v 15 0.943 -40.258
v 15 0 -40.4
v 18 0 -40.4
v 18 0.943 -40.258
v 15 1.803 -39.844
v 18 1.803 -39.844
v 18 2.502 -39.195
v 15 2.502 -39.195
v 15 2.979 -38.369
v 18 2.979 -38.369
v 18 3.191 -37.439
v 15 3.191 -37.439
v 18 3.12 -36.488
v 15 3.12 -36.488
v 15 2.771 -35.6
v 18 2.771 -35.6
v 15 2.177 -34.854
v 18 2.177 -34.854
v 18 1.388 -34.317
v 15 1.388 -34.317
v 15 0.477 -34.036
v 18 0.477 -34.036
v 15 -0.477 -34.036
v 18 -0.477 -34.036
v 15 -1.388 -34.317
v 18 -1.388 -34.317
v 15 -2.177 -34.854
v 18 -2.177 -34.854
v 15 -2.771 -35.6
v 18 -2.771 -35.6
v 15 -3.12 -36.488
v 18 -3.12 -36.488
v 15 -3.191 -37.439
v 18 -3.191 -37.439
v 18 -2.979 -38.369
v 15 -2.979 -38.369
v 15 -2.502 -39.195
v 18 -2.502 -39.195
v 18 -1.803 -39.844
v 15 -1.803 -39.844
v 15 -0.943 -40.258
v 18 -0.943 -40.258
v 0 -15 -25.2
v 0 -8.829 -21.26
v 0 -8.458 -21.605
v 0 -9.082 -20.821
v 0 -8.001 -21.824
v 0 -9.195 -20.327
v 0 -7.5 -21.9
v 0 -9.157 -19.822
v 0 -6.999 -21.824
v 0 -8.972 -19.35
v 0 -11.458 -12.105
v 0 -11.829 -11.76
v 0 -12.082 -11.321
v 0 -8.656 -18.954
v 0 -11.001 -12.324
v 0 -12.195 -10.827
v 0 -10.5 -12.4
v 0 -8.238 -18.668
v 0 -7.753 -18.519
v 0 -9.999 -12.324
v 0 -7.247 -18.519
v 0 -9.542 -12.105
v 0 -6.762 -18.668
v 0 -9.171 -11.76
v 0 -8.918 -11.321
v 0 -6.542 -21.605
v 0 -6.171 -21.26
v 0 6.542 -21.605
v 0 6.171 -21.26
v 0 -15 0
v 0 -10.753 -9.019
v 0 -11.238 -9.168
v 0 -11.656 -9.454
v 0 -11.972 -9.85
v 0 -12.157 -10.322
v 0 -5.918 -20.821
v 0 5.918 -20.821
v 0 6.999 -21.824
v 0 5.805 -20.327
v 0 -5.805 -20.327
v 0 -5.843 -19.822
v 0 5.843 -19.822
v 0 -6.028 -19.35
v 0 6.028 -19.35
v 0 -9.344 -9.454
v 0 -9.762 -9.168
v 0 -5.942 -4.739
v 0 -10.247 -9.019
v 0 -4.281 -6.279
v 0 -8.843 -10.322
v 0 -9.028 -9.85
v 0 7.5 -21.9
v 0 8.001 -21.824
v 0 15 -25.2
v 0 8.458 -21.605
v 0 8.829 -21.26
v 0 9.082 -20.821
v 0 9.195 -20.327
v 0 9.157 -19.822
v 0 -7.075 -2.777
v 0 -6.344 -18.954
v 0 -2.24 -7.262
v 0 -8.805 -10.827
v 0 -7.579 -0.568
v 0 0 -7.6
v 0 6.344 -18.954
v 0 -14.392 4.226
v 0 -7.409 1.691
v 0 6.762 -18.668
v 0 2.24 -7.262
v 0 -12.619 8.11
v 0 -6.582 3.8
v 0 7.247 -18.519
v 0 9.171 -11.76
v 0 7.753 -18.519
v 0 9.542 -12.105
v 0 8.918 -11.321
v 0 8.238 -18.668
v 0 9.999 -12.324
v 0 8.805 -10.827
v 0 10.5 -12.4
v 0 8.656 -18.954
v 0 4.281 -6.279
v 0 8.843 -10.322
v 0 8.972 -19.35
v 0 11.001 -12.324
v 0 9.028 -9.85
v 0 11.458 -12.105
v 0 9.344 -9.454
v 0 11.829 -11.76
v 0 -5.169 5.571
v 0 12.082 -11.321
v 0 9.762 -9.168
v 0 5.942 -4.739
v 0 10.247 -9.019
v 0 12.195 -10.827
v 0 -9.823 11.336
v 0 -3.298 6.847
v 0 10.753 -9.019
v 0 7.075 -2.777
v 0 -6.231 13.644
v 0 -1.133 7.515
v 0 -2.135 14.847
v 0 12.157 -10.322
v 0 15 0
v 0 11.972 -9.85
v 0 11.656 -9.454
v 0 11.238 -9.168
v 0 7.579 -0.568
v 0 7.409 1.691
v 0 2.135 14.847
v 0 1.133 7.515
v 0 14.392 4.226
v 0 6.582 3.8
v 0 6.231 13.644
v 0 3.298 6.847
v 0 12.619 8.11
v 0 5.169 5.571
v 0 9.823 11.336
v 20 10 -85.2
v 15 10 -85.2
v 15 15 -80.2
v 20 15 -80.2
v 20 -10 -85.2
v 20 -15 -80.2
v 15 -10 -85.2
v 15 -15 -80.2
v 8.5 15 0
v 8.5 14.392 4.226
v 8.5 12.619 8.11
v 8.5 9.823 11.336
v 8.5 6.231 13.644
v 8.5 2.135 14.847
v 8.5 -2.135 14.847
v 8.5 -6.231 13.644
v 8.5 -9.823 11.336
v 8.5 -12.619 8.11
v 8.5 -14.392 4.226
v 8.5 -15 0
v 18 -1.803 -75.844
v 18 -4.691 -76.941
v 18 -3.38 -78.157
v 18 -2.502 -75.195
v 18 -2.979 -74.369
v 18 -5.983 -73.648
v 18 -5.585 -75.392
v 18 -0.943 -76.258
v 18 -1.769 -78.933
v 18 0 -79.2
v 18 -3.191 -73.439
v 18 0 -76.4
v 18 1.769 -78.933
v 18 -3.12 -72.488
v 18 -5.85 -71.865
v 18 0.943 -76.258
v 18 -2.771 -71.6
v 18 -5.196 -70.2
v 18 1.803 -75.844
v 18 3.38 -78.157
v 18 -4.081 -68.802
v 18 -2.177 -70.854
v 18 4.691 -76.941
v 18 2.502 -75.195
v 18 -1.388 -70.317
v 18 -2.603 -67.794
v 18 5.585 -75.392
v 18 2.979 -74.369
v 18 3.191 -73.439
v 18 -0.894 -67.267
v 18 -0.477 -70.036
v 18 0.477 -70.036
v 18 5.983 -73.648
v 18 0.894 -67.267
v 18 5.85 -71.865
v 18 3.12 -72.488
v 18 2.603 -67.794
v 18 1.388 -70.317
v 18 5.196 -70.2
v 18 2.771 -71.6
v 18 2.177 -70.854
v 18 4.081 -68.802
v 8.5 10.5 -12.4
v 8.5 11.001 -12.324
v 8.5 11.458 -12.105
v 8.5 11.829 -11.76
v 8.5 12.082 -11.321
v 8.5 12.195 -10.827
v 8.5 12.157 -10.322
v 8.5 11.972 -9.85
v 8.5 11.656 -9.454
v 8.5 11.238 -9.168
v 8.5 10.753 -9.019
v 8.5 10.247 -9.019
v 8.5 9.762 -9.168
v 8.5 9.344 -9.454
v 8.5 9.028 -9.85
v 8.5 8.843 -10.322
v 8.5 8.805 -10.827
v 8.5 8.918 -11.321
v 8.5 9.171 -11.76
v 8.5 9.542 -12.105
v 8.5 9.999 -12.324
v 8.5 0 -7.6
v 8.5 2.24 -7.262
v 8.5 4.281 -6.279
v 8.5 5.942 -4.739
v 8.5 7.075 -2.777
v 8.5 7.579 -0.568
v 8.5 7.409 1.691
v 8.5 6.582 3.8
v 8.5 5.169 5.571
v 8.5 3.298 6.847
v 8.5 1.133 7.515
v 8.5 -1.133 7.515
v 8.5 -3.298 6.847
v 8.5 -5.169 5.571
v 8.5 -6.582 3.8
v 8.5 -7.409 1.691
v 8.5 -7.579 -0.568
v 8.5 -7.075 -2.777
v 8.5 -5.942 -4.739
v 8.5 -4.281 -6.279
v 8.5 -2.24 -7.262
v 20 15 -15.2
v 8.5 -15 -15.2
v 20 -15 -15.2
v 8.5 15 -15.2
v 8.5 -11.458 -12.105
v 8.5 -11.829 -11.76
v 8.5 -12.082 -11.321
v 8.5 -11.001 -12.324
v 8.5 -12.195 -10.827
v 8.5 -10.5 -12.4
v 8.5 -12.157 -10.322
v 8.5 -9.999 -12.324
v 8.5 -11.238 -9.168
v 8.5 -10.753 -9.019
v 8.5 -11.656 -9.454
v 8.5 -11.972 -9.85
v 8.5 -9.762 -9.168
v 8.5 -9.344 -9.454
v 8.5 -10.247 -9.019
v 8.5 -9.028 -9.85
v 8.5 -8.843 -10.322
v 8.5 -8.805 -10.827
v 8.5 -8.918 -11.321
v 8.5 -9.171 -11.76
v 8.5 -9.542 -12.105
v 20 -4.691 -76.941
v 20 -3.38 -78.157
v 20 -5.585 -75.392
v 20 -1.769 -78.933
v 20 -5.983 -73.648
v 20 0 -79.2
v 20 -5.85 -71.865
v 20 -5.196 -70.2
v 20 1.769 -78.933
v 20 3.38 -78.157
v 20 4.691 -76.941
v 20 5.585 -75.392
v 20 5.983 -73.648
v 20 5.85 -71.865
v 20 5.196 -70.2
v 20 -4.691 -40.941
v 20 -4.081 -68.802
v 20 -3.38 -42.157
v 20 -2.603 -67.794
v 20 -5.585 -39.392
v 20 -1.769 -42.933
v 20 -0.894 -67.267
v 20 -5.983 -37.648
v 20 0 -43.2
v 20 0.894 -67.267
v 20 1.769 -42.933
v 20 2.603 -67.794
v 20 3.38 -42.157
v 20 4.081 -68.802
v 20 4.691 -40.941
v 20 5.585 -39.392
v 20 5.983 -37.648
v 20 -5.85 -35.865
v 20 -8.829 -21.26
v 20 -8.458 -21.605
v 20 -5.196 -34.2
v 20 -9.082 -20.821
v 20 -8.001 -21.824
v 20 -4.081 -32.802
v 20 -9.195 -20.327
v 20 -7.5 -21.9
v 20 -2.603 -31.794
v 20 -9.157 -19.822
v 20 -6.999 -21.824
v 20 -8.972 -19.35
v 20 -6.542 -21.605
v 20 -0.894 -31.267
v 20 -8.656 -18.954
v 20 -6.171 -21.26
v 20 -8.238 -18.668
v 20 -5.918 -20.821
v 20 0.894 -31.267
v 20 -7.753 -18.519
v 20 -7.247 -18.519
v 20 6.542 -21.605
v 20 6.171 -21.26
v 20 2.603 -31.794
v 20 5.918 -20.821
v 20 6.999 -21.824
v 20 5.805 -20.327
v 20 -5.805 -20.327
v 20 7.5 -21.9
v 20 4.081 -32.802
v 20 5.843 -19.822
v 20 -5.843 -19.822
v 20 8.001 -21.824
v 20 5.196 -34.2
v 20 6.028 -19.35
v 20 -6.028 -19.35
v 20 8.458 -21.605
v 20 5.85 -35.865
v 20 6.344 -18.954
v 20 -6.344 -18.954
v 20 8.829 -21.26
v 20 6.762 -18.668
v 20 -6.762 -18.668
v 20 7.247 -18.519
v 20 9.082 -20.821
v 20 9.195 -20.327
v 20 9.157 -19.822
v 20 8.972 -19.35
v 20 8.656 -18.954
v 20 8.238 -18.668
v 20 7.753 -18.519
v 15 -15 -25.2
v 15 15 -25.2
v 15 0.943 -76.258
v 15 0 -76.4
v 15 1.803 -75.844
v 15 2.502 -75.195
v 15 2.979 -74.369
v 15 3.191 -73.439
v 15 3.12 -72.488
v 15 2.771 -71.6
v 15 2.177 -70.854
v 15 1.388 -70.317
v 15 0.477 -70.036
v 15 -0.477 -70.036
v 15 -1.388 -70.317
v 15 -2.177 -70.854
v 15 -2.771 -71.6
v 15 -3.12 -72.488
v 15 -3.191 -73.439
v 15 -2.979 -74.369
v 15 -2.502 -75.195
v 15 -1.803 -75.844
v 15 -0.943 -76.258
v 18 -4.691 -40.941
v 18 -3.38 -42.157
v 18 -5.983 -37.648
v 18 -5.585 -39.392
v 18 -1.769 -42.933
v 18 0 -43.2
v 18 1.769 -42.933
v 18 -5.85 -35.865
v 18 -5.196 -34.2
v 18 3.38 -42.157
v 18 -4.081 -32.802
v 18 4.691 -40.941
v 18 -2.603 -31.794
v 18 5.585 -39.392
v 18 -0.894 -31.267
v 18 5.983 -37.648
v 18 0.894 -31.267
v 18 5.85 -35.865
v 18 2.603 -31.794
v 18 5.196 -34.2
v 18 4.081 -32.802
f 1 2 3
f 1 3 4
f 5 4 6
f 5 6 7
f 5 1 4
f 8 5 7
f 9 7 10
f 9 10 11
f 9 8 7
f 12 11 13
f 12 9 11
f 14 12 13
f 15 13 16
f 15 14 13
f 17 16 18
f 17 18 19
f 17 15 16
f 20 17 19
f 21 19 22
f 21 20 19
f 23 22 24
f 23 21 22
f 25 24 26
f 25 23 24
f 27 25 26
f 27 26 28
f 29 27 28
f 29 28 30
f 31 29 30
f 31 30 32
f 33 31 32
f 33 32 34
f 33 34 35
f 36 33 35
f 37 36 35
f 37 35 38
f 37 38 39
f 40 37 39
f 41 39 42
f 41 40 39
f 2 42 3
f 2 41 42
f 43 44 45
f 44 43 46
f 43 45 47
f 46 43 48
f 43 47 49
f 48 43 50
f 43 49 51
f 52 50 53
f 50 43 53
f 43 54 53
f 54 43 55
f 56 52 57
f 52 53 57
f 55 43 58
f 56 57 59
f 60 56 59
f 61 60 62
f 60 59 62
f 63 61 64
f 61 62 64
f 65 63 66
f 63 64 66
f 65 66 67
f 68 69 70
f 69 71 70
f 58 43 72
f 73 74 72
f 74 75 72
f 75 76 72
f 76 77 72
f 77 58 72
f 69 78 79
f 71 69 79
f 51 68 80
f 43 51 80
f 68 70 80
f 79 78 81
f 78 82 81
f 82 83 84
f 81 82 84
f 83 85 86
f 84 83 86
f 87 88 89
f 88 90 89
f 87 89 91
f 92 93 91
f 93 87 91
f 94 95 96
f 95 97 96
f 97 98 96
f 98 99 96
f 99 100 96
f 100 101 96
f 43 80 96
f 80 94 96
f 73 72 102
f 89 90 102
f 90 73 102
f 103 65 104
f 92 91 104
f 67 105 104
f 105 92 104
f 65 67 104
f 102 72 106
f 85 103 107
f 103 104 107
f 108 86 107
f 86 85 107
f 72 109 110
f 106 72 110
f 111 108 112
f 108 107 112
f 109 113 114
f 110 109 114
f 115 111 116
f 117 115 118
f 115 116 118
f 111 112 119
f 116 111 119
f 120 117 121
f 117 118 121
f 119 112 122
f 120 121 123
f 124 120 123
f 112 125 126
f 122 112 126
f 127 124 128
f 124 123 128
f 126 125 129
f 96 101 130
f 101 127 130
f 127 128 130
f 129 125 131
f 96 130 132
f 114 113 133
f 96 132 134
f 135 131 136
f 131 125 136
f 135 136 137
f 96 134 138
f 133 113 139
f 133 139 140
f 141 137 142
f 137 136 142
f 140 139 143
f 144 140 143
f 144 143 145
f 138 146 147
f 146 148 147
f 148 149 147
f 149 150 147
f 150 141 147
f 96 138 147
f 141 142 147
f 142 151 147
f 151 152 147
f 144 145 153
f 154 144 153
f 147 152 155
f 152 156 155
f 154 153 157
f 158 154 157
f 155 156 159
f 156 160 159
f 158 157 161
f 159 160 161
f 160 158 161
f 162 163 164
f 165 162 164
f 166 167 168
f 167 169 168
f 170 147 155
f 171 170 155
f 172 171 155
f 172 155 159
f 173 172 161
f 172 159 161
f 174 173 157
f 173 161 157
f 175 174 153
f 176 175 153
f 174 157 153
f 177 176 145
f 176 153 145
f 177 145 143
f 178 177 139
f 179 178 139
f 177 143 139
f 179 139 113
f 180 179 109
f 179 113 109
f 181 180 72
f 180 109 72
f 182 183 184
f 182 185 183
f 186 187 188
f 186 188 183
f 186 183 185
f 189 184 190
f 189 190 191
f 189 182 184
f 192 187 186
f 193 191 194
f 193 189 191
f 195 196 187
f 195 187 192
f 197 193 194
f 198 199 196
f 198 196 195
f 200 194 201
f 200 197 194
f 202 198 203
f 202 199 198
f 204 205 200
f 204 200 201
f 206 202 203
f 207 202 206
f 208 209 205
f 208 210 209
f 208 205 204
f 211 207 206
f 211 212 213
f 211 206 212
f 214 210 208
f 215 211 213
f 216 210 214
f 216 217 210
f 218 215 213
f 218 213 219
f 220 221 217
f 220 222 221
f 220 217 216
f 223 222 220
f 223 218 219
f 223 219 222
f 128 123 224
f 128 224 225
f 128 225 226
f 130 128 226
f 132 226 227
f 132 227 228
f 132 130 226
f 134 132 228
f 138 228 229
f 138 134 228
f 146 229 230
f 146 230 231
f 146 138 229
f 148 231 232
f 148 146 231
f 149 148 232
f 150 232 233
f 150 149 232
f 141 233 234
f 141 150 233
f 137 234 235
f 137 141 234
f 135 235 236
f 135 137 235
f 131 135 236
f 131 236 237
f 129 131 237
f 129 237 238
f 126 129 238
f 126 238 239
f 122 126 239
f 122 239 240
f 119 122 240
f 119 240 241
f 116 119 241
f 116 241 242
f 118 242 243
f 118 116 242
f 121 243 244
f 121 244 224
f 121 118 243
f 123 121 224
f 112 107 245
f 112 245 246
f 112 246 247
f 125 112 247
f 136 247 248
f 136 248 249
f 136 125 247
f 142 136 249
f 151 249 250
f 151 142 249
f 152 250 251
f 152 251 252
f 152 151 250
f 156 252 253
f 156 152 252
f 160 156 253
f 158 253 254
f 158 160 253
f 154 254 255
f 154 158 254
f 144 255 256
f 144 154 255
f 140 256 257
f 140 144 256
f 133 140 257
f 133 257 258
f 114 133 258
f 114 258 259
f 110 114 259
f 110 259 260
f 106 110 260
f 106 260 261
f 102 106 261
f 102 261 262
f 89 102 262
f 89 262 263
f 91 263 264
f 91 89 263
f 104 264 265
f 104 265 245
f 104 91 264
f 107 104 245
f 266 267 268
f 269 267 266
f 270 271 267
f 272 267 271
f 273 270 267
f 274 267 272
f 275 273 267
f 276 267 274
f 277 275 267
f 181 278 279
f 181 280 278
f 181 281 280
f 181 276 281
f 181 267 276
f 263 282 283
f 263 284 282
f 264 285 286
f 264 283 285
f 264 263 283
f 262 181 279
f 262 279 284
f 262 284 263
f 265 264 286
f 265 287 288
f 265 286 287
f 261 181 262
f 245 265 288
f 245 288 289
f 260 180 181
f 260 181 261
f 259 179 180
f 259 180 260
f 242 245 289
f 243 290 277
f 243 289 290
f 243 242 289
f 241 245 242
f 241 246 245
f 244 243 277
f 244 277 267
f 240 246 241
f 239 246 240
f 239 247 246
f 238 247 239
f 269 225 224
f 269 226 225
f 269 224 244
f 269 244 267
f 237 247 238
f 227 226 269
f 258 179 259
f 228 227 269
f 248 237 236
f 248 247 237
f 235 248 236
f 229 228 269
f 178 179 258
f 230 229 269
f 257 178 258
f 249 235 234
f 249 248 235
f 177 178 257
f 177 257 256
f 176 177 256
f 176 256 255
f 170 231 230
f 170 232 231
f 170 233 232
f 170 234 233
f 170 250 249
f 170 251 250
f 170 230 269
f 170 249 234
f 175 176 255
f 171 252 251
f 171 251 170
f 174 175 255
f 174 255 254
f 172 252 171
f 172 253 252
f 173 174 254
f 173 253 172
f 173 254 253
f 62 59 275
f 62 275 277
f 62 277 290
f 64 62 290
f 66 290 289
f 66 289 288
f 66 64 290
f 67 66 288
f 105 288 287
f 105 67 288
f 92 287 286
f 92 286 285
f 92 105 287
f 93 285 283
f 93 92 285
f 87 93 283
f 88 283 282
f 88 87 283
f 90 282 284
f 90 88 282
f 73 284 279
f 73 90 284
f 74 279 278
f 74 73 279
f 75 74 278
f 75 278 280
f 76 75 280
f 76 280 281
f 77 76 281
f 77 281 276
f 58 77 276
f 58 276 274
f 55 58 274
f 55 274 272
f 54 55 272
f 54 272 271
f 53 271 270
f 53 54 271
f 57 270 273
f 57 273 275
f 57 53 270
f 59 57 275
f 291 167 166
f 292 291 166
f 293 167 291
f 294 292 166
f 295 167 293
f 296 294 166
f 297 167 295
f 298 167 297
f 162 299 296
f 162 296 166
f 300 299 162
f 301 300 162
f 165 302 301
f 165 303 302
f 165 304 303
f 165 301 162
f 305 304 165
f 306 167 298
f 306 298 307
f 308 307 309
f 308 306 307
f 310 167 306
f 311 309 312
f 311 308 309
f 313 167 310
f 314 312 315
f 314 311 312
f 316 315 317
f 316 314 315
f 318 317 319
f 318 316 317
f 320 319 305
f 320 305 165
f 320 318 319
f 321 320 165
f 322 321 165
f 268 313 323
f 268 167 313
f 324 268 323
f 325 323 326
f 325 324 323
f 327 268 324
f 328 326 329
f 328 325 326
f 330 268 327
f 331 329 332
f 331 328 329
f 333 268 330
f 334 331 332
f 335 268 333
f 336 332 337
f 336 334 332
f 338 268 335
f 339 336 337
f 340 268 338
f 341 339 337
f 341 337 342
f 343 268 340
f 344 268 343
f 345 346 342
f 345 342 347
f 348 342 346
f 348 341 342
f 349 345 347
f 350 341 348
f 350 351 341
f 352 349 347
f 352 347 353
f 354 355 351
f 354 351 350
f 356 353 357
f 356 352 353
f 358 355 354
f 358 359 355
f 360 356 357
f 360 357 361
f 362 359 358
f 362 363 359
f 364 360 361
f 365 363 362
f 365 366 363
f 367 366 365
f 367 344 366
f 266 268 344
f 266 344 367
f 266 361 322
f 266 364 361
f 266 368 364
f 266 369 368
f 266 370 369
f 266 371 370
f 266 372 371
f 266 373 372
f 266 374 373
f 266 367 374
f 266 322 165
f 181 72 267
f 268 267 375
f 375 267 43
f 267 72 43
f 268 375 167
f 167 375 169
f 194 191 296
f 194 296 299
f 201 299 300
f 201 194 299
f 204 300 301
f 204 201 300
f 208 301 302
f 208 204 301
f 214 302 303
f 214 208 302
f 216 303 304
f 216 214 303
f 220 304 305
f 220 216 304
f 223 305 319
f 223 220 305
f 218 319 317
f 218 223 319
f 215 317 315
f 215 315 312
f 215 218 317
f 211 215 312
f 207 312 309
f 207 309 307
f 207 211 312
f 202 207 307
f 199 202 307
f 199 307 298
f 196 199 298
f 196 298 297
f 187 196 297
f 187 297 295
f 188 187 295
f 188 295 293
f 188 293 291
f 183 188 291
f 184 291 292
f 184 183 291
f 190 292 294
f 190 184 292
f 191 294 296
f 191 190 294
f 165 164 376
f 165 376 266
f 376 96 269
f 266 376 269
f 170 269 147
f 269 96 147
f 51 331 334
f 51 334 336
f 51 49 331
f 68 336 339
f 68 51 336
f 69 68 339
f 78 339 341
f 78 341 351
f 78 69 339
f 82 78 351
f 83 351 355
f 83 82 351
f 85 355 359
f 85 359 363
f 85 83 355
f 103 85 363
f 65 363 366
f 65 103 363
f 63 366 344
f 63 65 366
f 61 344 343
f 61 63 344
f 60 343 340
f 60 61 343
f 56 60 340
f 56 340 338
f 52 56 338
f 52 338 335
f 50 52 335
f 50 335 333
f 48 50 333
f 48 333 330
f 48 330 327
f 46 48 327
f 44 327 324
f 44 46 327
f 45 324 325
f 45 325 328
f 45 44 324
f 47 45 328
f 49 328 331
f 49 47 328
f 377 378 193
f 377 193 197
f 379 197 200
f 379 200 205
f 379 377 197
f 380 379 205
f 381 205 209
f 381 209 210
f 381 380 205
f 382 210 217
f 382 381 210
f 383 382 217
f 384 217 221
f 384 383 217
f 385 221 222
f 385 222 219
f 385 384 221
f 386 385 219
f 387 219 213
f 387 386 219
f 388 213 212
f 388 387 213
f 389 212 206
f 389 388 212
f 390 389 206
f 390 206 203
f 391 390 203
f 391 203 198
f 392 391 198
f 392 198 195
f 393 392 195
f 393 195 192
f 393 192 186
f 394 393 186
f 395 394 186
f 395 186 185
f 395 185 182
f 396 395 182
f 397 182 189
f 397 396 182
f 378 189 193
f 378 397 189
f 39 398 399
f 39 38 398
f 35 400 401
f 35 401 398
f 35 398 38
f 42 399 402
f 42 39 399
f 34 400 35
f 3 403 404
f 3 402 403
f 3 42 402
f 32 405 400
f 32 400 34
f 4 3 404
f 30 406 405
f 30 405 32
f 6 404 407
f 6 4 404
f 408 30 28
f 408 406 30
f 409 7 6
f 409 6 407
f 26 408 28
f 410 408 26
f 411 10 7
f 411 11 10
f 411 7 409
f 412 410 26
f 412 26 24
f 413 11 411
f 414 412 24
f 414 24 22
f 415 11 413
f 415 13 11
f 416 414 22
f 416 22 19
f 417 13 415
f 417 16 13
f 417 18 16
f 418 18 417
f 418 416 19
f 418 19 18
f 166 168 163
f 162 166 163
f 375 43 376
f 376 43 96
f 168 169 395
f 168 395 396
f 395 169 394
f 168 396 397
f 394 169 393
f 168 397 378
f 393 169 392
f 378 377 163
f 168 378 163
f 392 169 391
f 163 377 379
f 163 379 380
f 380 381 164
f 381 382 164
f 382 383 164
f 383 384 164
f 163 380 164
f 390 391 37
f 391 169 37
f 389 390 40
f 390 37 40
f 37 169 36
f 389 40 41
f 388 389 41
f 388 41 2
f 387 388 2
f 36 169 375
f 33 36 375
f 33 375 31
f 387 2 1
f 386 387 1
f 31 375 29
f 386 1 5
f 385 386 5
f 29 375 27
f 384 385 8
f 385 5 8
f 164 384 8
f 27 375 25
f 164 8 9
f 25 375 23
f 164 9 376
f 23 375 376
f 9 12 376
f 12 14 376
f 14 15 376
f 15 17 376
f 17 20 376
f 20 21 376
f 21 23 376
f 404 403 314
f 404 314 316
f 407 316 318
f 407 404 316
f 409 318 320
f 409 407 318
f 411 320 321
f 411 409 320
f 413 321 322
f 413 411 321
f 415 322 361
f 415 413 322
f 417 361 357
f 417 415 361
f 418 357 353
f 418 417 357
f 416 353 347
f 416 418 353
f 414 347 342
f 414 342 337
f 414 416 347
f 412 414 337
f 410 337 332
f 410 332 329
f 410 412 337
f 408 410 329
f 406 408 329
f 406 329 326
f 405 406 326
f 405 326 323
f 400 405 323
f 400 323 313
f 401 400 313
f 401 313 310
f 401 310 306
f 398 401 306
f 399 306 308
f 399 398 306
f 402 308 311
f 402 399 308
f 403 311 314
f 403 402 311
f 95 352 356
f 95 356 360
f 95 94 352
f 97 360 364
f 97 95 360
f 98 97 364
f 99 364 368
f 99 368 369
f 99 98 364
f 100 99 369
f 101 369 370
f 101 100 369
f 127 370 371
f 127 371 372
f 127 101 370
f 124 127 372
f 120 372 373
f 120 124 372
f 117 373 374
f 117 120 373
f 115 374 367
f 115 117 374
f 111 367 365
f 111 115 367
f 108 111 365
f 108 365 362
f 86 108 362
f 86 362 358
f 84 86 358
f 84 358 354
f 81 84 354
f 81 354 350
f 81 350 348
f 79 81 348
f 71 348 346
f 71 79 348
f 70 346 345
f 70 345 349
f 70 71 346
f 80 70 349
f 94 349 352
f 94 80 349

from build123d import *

# Parameters (mm, degrees)
SKETCH1_R           = 1.7
SKETCH1_R_2         = 7.6
BOSS_EXTRUDE1_DEPTH = 8.5
SKETCH1_4_W         = 30
SKETCH1_4_H         = 10
SKETCH1_4_R         = 1.7
BOSS_EXTRUDE2_DEPTH = 15
BOSS_EXTRUDE3_START = 15
SKETCH1_5_R         = 6
SKETCH1_5_W         = 30
SKETCH1_5_H         = 10
SKETCH1_5_R_2       = 1.7
SKETCH1_5_R_3       = 3.2
BOSS_EXTRUDE3_DEPTH = 3
BOSS_EXTRUDE4_START = 18
SKETCH1_6_R         = 6
SKETCH1_6_W         = 30
SKETCH1_6_H         = 10
SKETCH1_6_R_2       = 1.7
BOSS_EXTRUDE4_DEPTH = 2


with BuildPart() as part:
    # Sketch1 → Boss-Extrude1 (new body)
    with BuildSketch(Plane.YZ):
        with BuildLine():
            ThreePointArc((15, 0), (0, 15), (-15, 0))
            Line((-15, 0), (-15, -25.2))
            Line((-15, -25.2), (15, -25.2))
            Line((15, -25.2), (15, 0))
        make_face()
        with Locations(Location((-10.5, -10.7, 0), (0, 0, 270))):
            Circle(SKETCH1_R, mode=Mode.SUBTRACT)
        with Locations(Location((10.5, -10.7, 0), (0, 0, 270))):
            Circle(SKETCH1_R, mode=Mode.SUBTRACT)
        with Locations(Location((0, 0, 0), (0, 0, 270))):
            Circle(SKETCH1_R_2, mode=Mode.SUBTRACT)
        with Locations(Location((7.5, -20.2, 0), (0, 0, 270))):
            Circle(SKETCH1_R, mode=Mode.SUBTRACT)
        with Locations(Location((-7.5, -20.2, 0), (0, 0, 270))):
            Circle(SKETCH1_R, mode=Mode.SUBTRACT)
    extrude(amount=BOSS_EXTRUDE1_DEPTH)

    # Sketch1<4> → Boss-Extrude2 (add)
    with BuildSketch(Plane.YZ):
        with Locations((0, -20.2)):
            Rectangle(SKETCH1_4_W, SKETCH1_4_H)
        with Locations(Location((-7.5, -20.2, 0), (0, 0, 270))):
            Circle(SKETCH1_4_R, mode=Mode.SUBTRACT)
        with Locations(Location((7.5, -20.2, 0), (0, 0, 270))):
            Circle(SKETCH1_4_R, mode=Mode.SUBTRACT)
    extrude(amount=BOSS_EXTRUDE2_DEPTH)

    # Sketch1<5> → Boss-Extrude3 (add)
    # profile 1 of 4: a face of its own
    with BuildSketch(Plane.YZ.offset(BOSS_EXTRUDE3_START)):
        Polygon((15, -25.2), (-15, -25.2), (-15, -80.2), (-10, -85.2), (10, -85.2), (15, -80.2), align=None)
        with Locations((0, -73.2)):
            Circle(SKETCH1_5_R, mode=Mode.SUBTRACT)
        with Locations((0, -37.2)):
            Circle(SKETCH1_5_R, mode=Mode.SUBTRACT)
    # profile 2 of 4: a face of its own
    with BuildSketch(Plane.YZ.offset(BOSS_EXTRUDE3_START)):
        with Locations((0, -20.2)):
            Rectangle(SKETCH1_5_W, SKETCH1_5_H)
        with Locations(Location((-7.5, -20.2, 0), (0, 0, 270))):
            Circle(SKETCH1_5_R_2, mode=Mode.SUBTRACT)
        with Locations(Location((7.5, -20.2, 0), (0, 0, 270))):
            Circle(SKETCH1_5_R_2, mode=Mode.SUBTRACT)
    # profile 3 of 4: a face of its own
    with BuildSketch(Plane.YZ.offset(BOSS_EXTRUDE3_START)):
        with Locations((0, -37.2)):
            Circle(SKETCH1_5_R)
        with Locations(Location((0, -37.2, 0), (0, 0, 270))):
            Circle(SKETCH1_5_R_3, mode=Mode.SUBTRACT)
    # profile 4 of 4: a face of its own
    with BuildSketch(Plane.YZ.offset(BOSS_EXTRUDE3_START)):
        with Locations((0, -73.2)):
            Circle(SKETCH1_5_R)
        with Locations(Location((0, -73.2, 0), (0, 0, 270))):
            Circle(SKETCH1_5_R_3, mode=Mode.SUBTRACT)
    extrude(amount=BOSS_EXTRUDE3_DEPTH)

    # Sketch1<6> → Boss-Extrude4 (add)
    # profile 1 of 2: a face of its own
    with BuildSketch(Plane.YZ.offset(BOSS_EXTRUDE4_START)):
        Polygon((15, -25.2), (-15, -25.2), (-15, -80.2), (-10, -85.2), (10, -85.2), (15, -80.2), align=None)
        with Locations(Location((0, -73.2, 0), (0, 0, 270))):
            Circle(SKETCH1_6_R, mode=Mode.SUBTRACT)
        with Locations(Location((0, -37.2, 0), (0, 0, 270))):
            Circle(SKETCH1_6_R, mode=Mode.SUBTRACT)
    # profile 2 of 2: a face of its own
    with BuildSketch(Plane.YZ.offset(BOSS_EXTRUDE4_START)):
        with Locations((0, -20.2)):
            Rectangle(SKETCH1_6_W, SKETCH1_6_H)
        with Locations(Location((-7.5, -20.2, 0), (0, 0, 270))):
            Circle(SKETCH1_6_R_2, mode=Mode.SUBTRACT)
        with Locations(Location((7.5, -20.2, 0), (0, 0, 270))):
            Circle(SKETCH1_6_R_2, mode=Mode.SUBTRACT)
    extrude(amount=BOSS_EXTRUDE4_DEPTH)


solid = part.part
